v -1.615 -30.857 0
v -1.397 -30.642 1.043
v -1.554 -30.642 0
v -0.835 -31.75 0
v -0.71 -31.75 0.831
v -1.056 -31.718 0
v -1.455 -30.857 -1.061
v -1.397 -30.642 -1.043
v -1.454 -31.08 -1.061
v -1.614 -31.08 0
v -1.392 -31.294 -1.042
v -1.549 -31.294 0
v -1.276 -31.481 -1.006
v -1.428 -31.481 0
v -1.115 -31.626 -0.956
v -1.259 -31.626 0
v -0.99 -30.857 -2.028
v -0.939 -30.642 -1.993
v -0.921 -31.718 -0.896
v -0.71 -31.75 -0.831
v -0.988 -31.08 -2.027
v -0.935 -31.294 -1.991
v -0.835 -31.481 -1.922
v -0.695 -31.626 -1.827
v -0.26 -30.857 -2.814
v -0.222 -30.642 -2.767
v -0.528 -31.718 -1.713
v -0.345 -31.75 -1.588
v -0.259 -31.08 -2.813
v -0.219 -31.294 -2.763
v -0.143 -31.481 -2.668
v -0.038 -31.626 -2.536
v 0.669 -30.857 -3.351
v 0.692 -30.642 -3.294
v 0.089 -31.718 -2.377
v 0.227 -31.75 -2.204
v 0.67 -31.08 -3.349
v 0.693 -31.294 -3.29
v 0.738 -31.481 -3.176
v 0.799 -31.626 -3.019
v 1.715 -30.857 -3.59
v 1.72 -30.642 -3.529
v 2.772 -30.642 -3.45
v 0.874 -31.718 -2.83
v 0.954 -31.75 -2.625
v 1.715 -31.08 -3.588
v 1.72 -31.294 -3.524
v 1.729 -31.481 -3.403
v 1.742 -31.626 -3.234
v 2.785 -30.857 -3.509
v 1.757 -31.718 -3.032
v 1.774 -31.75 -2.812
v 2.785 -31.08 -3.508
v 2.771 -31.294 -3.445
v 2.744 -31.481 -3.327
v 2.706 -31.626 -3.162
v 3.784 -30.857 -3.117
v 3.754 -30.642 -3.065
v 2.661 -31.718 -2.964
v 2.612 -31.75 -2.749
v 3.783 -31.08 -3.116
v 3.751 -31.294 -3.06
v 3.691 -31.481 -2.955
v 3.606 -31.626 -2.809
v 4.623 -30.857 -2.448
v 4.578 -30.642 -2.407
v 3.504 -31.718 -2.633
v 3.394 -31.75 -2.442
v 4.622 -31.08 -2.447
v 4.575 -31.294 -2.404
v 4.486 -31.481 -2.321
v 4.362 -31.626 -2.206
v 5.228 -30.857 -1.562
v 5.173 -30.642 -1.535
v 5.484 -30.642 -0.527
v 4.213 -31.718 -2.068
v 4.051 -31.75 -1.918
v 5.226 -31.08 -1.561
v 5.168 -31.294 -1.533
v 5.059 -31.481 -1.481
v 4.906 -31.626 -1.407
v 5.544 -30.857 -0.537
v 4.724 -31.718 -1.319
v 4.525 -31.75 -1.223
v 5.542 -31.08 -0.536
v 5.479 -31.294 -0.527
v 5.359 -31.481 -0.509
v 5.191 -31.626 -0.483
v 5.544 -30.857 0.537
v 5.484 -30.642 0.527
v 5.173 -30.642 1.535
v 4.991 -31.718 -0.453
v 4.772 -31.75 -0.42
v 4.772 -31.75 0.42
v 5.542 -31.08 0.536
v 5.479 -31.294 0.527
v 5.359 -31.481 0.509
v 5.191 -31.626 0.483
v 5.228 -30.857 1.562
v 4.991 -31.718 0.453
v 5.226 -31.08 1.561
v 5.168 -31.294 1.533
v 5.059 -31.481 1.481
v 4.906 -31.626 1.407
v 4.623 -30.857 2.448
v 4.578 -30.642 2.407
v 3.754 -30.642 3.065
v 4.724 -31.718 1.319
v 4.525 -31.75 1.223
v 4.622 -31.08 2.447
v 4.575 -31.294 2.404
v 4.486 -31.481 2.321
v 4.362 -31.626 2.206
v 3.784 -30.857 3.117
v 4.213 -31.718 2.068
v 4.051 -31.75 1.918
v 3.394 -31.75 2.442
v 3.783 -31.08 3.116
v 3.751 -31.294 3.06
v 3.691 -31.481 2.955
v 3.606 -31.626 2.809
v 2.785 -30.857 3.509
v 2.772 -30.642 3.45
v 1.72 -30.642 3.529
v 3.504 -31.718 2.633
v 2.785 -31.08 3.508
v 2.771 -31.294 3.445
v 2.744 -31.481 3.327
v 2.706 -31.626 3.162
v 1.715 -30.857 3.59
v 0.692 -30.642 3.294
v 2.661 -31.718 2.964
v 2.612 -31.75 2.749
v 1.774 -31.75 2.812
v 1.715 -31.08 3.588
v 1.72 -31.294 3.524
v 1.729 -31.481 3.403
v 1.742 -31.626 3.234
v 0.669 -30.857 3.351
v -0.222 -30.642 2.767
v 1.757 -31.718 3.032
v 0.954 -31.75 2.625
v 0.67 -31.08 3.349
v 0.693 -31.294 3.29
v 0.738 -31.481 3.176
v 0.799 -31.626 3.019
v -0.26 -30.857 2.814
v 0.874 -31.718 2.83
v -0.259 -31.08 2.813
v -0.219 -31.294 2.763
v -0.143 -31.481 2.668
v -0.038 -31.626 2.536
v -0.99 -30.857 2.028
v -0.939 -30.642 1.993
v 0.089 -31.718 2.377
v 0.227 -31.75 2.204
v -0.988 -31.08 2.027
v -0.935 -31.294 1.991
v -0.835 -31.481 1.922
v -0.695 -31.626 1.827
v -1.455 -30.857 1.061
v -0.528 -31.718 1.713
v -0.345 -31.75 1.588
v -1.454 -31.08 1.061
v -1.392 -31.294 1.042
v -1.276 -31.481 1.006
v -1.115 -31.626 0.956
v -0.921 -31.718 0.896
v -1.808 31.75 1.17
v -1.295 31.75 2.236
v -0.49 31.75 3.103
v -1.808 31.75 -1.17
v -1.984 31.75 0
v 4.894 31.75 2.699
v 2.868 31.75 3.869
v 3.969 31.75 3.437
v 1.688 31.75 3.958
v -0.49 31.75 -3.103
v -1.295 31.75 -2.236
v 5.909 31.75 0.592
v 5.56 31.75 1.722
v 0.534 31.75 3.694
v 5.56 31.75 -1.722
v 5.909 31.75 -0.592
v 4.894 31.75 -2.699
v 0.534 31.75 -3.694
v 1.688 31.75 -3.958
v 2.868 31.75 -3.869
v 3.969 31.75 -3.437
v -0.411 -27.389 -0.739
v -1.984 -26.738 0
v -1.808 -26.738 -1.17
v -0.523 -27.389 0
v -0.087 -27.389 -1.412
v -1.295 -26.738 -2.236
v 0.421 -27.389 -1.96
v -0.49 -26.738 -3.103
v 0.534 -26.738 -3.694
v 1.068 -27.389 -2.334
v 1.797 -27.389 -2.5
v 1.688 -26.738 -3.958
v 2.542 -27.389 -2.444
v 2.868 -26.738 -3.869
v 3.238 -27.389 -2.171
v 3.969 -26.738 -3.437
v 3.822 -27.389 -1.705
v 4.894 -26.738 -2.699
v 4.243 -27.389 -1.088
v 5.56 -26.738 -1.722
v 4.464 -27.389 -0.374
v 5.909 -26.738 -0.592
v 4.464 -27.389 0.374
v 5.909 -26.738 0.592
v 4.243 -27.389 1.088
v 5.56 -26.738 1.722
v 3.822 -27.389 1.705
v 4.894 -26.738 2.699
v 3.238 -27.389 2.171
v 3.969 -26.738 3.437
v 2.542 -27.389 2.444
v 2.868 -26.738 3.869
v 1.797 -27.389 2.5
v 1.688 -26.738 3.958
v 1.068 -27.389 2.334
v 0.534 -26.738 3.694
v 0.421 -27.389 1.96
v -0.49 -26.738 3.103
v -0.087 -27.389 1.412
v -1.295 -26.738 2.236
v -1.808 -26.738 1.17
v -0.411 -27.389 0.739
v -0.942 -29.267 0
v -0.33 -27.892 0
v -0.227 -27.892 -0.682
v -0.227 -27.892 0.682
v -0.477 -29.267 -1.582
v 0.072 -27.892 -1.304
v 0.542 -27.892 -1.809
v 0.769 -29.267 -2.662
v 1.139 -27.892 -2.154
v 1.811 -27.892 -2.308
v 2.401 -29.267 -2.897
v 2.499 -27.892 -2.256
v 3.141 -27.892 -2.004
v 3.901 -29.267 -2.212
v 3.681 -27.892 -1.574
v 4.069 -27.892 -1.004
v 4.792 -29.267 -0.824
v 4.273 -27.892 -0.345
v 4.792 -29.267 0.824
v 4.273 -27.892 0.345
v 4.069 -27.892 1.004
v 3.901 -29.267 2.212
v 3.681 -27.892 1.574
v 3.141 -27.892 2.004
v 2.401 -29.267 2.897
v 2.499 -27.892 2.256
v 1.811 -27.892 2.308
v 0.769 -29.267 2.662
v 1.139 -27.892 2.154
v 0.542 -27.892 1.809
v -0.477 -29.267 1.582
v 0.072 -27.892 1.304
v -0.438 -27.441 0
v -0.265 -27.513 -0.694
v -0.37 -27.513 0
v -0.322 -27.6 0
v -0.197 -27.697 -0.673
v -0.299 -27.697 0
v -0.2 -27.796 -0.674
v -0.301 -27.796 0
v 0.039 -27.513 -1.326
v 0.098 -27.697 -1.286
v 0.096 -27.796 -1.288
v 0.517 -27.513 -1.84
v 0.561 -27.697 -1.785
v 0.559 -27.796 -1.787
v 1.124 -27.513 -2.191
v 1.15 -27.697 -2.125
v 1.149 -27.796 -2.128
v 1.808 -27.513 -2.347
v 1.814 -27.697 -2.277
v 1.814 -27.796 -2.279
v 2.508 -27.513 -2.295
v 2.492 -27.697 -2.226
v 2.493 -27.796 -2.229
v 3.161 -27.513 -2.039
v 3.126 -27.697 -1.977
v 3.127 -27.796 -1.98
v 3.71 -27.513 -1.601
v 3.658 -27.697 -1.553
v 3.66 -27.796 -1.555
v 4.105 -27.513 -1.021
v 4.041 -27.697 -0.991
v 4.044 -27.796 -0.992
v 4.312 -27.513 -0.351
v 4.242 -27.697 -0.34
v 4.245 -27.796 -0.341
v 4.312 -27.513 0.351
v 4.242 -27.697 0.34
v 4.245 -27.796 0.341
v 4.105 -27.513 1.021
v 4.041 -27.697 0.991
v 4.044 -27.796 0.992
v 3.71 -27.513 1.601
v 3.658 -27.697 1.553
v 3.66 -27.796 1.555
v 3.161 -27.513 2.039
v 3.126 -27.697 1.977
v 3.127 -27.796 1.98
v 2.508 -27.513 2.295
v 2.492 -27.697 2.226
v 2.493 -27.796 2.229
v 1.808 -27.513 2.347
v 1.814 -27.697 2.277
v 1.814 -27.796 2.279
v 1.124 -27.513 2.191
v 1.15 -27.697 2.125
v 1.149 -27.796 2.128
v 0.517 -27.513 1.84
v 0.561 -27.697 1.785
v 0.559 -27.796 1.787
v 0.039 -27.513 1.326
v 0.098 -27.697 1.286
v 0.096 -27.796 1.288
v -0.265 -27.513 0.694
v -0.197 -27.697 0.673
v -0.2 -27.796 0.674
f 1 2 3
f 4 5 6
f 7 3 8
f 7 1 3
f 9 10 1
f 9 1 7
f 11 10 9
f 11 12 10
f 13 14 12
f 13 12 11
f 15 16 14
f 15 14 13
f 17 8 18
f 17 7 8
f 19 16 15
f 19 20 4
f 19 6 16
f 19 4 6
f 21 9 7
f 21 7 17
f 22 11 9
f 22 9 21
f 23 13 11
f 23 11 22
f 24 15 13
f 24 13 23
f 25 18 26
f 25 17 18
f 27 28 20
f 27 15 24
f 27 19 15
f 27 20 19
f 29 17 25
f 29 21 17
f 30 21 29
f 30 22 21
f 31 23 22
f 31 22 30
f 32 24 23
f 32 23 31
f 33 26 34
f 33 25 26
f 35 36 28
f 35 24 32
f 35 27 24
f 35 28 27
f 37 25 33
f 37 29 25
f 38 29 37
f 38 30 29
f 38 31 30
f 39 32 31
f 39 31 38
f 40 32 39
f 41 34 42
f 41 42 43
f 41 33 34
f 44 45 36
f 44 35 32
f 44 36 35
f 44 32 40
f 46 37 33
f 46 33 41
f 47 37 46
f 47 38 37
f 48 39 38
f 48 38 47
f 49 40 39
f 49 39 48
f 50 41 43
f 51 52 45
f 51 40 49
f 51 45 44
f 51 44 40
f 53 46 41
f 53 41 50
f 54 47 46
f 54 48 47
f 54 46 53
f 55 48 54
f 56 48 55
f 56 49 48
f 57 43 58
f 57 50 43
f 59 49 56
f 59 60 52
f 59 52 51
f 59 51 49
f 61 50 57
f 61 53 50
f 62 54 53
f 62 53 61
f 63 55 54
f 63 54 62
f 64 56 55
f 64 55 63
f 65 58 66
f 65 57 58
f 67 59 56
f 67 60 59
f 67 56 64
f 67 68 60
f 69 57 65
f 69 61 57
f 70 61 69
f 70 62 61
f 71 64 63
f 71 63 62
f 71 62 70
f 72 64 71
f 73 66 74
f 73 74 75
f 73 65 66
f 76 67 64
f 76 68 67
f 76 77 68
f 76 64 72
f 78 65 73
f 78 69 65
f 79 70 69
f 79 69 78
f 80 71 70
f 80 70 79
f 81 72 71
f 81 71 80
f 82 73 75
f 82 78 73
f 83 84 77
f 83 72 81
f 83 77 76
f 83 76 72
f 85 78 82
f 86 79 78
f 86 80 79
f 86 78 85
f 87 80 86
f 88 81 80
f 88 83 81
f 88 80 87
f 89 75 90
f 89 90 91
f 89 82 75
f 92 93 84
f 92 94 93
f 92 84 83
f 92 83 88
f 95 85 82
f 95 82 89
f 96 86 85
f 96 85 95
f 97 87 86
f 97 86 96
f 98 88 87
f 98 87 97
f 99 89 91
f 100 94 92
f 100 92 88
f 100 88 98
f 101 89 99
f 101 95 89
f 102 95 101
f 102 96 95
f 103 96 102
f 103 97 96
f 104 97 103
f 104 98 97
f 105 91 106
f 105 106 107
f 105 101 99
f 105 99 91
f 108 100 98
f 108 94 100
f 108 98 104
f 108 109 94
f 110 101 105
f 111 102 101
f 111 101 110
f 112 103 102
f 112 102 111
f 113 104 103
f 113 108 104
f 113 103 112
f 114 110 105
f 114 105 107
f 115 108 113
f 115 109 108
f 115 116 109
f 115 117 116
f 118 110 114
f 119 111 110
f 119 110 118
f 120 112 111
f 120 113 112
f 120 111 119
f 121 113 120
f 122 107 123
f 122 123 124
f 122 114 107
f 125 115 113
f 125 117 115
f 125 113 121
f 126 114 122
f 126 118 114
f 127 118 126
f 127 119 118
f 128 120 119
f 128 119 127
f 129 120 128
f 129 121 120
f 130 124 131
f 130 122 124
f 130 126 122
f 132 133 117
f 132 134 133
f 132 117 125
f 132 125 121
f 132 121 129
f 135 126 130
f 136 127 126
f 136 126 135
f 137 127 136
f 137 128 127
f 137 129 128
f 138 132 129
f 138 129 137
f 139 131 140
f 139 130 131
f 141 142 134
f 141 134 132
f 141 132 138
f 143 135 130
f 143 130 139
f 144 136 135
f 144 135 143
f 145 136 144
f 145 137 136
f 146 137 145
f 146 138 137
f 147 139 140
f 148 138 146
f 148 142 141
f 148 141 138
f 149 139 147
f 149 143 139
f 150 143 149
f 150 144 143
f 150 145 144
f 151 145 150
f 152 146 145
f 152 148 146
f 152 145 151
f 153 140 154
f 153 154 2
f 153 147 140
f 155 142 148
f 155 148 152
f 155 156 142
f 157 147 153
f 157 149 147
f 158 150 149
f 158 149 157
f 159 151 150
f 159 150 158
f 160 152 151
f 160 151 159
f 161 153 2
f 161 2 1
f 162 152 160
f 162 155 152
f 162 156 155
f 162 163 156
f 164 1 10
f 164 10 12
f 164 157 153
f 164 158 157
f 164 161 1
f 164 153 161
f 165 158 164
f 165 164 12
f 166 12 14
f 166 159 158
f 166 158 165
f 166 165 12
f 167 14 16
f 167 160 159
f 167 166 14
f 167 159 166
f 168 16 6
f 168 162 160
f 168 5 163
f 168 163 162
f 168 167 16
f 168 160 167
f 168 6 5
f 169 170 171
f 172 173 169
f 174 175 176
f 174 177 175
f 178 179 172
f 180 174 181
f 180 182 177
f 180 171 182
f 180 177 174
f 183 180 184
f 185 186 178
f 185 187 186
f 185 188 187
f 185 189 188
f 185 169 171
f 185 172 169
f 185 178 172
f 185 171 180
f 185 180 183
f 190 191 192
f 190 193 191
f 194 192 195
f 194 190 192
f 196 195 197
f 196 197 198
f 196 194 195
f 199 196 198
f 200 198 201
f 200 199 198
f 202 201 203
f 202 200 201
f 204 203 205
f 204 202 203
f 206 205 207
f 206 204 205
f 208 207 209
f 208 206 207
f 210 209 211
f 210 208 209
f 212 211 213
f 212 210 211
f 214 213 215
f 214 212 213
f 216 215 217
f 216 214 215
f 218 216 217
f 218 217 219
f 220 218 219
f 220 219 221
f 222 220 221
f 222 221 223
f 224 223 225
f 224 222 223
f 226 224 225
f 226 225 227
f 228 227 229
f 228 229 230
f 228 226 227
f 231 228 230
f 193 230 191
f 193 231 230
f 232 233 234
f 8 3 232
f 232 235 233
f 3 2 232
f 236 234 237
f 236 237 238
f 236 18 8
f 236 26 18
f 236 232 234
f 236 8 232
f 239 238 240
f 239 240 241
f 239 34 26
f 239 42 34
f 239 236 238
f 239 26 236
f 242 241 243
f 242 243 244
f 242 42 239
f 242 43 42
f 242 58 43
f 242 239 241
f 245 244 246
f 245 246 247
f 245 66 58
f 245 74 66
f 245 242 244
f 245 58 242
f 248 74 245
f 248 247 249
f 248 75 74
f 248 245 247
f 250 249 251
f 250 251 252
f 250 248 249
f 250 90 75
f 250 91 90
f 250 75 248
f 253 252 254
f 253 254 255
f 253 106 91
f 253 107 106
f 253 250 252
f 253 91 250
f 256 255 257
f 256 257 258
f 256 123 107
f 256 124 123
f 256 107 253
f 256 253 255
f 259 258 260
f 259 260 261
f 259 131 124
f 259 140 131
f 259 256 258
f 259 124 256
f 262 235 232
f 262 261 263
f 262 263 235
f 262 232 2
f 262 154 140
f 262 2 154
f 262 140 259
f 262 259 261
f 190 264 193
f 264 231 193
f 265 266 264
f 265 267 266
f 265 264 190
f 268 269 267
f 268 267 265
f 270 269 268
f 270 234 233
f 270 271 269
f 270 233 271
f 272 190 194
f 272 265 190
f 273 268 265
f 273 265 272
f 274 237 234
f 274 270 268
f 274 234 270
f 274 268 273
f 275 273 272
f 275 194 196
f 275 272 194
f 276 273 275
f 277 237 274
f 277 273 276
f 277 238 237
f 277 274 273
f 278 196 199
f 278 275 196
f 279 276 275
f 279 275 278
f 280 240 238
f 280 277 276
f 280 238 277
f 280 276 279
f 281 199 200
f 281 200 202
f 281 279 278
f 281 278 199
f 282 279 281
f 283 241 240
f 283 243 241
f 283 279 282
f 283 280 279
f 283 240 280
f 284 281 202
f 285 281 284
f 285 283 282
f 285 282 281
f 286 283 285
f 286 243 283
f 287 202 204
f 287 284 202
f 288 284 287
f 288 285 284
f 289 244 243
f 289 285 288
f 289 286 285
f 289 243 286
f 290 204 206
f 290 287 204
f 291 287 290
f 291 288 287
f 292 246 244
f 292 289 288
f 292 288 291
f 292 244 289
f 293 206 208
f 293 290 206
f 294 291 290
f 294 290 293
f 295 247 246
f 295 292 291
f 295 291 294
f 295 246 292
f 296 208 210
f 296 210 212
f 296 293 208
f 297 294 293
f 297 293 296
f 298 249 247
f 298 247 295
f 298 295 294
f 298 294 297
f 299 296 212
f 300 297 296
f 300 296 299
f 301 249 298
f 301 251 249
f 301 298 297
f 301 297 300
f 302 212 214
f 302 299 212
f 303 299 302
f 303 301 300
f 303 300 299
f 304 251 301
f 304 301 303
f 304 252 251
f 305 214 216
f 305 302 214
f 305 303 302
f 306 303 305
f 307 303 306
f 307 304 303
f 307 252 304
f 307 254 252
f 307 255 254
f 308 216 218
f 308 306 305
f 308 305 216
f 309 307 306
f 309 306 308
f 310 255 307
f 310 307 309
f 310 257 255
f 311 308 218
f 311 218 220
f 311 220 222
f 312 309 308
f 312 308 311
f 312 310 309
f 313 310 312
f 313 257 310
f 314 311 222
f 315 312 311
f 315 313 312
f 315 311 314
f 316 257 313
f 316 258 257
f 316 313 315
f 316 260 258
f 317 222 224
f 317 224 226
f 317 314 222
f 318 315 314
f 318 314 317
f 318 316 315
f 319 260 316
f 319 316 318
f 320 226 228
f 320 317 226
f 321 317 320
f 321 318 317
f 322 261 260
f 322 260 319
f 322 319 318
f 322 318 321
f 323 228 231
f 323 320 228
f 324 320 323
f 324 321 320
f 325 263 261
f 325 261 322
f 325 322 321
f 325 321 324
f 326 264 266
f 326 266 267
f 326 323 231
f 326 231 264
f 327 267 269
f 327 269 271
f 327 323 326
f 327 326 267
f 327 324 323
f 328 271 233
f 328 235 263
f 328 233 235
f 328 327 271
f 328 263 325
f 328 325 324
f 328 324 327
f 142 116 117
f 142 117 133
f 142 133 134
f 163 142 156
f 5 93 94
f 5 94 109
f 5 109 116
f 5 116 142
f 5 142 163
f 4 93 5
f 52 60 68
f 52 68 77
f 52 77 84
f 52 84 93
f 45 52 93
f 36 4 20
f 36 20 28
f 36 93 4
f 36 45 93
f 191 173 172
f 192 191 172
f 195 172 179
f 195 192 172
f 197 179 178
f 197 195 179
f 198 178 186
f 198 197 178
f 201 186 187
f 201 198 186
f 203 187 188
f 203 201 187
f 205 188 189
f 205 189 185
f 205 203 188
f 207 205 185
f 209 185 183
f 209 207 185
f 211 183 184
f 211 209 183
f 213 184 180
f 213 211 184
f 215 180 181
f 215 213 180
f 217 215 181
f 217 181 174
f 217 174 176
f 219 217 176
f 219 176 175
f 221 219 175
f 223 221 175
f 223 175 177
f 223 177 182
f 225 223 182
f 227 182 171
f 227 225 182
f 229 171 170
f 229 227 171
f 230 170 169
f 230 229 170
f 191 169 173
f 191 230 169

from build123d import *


# Not quite as in the source:
# - ends of sketch curves that miss each other by under 0.0002 mm in the source are joined


with BuildPart() as f2:
    # F1 (on Top) → F2 (revolve)
    with BuildSketch(Plane.XY):
        with BuildLine():
            ThreePointArc((-1.5543495265, -30.6423329465), (-1.4953949864, -31.3914475732), (-0.835025, -31.75))
            Line((-0.835025, -31.75), (1.984375, -31.75))
            Line((1.984375, -31.75), (1.984375, 31.75))
            Line((1.984375, 31.75), (-1.984375, 31.75))
            Line((-1.984375, 31.75), (-1.984375, -26.7380212))
            Line((-1.984375, -26.7380212), (-0.5228082, -27.3887438))
            ThreePointArc((-0.5228082, -27.3887438), (-0.322079197, -27.6002624898), (-0.3297130763, -27.8917673251))
            Line((-0.3297130763, -27.8917673251), (-1.5543495265, -30.6423329465))
        make_face()
    revolve(axis=Axis((1.984375, 0, 0), (0, -1, 0)))


solid = f2.part
